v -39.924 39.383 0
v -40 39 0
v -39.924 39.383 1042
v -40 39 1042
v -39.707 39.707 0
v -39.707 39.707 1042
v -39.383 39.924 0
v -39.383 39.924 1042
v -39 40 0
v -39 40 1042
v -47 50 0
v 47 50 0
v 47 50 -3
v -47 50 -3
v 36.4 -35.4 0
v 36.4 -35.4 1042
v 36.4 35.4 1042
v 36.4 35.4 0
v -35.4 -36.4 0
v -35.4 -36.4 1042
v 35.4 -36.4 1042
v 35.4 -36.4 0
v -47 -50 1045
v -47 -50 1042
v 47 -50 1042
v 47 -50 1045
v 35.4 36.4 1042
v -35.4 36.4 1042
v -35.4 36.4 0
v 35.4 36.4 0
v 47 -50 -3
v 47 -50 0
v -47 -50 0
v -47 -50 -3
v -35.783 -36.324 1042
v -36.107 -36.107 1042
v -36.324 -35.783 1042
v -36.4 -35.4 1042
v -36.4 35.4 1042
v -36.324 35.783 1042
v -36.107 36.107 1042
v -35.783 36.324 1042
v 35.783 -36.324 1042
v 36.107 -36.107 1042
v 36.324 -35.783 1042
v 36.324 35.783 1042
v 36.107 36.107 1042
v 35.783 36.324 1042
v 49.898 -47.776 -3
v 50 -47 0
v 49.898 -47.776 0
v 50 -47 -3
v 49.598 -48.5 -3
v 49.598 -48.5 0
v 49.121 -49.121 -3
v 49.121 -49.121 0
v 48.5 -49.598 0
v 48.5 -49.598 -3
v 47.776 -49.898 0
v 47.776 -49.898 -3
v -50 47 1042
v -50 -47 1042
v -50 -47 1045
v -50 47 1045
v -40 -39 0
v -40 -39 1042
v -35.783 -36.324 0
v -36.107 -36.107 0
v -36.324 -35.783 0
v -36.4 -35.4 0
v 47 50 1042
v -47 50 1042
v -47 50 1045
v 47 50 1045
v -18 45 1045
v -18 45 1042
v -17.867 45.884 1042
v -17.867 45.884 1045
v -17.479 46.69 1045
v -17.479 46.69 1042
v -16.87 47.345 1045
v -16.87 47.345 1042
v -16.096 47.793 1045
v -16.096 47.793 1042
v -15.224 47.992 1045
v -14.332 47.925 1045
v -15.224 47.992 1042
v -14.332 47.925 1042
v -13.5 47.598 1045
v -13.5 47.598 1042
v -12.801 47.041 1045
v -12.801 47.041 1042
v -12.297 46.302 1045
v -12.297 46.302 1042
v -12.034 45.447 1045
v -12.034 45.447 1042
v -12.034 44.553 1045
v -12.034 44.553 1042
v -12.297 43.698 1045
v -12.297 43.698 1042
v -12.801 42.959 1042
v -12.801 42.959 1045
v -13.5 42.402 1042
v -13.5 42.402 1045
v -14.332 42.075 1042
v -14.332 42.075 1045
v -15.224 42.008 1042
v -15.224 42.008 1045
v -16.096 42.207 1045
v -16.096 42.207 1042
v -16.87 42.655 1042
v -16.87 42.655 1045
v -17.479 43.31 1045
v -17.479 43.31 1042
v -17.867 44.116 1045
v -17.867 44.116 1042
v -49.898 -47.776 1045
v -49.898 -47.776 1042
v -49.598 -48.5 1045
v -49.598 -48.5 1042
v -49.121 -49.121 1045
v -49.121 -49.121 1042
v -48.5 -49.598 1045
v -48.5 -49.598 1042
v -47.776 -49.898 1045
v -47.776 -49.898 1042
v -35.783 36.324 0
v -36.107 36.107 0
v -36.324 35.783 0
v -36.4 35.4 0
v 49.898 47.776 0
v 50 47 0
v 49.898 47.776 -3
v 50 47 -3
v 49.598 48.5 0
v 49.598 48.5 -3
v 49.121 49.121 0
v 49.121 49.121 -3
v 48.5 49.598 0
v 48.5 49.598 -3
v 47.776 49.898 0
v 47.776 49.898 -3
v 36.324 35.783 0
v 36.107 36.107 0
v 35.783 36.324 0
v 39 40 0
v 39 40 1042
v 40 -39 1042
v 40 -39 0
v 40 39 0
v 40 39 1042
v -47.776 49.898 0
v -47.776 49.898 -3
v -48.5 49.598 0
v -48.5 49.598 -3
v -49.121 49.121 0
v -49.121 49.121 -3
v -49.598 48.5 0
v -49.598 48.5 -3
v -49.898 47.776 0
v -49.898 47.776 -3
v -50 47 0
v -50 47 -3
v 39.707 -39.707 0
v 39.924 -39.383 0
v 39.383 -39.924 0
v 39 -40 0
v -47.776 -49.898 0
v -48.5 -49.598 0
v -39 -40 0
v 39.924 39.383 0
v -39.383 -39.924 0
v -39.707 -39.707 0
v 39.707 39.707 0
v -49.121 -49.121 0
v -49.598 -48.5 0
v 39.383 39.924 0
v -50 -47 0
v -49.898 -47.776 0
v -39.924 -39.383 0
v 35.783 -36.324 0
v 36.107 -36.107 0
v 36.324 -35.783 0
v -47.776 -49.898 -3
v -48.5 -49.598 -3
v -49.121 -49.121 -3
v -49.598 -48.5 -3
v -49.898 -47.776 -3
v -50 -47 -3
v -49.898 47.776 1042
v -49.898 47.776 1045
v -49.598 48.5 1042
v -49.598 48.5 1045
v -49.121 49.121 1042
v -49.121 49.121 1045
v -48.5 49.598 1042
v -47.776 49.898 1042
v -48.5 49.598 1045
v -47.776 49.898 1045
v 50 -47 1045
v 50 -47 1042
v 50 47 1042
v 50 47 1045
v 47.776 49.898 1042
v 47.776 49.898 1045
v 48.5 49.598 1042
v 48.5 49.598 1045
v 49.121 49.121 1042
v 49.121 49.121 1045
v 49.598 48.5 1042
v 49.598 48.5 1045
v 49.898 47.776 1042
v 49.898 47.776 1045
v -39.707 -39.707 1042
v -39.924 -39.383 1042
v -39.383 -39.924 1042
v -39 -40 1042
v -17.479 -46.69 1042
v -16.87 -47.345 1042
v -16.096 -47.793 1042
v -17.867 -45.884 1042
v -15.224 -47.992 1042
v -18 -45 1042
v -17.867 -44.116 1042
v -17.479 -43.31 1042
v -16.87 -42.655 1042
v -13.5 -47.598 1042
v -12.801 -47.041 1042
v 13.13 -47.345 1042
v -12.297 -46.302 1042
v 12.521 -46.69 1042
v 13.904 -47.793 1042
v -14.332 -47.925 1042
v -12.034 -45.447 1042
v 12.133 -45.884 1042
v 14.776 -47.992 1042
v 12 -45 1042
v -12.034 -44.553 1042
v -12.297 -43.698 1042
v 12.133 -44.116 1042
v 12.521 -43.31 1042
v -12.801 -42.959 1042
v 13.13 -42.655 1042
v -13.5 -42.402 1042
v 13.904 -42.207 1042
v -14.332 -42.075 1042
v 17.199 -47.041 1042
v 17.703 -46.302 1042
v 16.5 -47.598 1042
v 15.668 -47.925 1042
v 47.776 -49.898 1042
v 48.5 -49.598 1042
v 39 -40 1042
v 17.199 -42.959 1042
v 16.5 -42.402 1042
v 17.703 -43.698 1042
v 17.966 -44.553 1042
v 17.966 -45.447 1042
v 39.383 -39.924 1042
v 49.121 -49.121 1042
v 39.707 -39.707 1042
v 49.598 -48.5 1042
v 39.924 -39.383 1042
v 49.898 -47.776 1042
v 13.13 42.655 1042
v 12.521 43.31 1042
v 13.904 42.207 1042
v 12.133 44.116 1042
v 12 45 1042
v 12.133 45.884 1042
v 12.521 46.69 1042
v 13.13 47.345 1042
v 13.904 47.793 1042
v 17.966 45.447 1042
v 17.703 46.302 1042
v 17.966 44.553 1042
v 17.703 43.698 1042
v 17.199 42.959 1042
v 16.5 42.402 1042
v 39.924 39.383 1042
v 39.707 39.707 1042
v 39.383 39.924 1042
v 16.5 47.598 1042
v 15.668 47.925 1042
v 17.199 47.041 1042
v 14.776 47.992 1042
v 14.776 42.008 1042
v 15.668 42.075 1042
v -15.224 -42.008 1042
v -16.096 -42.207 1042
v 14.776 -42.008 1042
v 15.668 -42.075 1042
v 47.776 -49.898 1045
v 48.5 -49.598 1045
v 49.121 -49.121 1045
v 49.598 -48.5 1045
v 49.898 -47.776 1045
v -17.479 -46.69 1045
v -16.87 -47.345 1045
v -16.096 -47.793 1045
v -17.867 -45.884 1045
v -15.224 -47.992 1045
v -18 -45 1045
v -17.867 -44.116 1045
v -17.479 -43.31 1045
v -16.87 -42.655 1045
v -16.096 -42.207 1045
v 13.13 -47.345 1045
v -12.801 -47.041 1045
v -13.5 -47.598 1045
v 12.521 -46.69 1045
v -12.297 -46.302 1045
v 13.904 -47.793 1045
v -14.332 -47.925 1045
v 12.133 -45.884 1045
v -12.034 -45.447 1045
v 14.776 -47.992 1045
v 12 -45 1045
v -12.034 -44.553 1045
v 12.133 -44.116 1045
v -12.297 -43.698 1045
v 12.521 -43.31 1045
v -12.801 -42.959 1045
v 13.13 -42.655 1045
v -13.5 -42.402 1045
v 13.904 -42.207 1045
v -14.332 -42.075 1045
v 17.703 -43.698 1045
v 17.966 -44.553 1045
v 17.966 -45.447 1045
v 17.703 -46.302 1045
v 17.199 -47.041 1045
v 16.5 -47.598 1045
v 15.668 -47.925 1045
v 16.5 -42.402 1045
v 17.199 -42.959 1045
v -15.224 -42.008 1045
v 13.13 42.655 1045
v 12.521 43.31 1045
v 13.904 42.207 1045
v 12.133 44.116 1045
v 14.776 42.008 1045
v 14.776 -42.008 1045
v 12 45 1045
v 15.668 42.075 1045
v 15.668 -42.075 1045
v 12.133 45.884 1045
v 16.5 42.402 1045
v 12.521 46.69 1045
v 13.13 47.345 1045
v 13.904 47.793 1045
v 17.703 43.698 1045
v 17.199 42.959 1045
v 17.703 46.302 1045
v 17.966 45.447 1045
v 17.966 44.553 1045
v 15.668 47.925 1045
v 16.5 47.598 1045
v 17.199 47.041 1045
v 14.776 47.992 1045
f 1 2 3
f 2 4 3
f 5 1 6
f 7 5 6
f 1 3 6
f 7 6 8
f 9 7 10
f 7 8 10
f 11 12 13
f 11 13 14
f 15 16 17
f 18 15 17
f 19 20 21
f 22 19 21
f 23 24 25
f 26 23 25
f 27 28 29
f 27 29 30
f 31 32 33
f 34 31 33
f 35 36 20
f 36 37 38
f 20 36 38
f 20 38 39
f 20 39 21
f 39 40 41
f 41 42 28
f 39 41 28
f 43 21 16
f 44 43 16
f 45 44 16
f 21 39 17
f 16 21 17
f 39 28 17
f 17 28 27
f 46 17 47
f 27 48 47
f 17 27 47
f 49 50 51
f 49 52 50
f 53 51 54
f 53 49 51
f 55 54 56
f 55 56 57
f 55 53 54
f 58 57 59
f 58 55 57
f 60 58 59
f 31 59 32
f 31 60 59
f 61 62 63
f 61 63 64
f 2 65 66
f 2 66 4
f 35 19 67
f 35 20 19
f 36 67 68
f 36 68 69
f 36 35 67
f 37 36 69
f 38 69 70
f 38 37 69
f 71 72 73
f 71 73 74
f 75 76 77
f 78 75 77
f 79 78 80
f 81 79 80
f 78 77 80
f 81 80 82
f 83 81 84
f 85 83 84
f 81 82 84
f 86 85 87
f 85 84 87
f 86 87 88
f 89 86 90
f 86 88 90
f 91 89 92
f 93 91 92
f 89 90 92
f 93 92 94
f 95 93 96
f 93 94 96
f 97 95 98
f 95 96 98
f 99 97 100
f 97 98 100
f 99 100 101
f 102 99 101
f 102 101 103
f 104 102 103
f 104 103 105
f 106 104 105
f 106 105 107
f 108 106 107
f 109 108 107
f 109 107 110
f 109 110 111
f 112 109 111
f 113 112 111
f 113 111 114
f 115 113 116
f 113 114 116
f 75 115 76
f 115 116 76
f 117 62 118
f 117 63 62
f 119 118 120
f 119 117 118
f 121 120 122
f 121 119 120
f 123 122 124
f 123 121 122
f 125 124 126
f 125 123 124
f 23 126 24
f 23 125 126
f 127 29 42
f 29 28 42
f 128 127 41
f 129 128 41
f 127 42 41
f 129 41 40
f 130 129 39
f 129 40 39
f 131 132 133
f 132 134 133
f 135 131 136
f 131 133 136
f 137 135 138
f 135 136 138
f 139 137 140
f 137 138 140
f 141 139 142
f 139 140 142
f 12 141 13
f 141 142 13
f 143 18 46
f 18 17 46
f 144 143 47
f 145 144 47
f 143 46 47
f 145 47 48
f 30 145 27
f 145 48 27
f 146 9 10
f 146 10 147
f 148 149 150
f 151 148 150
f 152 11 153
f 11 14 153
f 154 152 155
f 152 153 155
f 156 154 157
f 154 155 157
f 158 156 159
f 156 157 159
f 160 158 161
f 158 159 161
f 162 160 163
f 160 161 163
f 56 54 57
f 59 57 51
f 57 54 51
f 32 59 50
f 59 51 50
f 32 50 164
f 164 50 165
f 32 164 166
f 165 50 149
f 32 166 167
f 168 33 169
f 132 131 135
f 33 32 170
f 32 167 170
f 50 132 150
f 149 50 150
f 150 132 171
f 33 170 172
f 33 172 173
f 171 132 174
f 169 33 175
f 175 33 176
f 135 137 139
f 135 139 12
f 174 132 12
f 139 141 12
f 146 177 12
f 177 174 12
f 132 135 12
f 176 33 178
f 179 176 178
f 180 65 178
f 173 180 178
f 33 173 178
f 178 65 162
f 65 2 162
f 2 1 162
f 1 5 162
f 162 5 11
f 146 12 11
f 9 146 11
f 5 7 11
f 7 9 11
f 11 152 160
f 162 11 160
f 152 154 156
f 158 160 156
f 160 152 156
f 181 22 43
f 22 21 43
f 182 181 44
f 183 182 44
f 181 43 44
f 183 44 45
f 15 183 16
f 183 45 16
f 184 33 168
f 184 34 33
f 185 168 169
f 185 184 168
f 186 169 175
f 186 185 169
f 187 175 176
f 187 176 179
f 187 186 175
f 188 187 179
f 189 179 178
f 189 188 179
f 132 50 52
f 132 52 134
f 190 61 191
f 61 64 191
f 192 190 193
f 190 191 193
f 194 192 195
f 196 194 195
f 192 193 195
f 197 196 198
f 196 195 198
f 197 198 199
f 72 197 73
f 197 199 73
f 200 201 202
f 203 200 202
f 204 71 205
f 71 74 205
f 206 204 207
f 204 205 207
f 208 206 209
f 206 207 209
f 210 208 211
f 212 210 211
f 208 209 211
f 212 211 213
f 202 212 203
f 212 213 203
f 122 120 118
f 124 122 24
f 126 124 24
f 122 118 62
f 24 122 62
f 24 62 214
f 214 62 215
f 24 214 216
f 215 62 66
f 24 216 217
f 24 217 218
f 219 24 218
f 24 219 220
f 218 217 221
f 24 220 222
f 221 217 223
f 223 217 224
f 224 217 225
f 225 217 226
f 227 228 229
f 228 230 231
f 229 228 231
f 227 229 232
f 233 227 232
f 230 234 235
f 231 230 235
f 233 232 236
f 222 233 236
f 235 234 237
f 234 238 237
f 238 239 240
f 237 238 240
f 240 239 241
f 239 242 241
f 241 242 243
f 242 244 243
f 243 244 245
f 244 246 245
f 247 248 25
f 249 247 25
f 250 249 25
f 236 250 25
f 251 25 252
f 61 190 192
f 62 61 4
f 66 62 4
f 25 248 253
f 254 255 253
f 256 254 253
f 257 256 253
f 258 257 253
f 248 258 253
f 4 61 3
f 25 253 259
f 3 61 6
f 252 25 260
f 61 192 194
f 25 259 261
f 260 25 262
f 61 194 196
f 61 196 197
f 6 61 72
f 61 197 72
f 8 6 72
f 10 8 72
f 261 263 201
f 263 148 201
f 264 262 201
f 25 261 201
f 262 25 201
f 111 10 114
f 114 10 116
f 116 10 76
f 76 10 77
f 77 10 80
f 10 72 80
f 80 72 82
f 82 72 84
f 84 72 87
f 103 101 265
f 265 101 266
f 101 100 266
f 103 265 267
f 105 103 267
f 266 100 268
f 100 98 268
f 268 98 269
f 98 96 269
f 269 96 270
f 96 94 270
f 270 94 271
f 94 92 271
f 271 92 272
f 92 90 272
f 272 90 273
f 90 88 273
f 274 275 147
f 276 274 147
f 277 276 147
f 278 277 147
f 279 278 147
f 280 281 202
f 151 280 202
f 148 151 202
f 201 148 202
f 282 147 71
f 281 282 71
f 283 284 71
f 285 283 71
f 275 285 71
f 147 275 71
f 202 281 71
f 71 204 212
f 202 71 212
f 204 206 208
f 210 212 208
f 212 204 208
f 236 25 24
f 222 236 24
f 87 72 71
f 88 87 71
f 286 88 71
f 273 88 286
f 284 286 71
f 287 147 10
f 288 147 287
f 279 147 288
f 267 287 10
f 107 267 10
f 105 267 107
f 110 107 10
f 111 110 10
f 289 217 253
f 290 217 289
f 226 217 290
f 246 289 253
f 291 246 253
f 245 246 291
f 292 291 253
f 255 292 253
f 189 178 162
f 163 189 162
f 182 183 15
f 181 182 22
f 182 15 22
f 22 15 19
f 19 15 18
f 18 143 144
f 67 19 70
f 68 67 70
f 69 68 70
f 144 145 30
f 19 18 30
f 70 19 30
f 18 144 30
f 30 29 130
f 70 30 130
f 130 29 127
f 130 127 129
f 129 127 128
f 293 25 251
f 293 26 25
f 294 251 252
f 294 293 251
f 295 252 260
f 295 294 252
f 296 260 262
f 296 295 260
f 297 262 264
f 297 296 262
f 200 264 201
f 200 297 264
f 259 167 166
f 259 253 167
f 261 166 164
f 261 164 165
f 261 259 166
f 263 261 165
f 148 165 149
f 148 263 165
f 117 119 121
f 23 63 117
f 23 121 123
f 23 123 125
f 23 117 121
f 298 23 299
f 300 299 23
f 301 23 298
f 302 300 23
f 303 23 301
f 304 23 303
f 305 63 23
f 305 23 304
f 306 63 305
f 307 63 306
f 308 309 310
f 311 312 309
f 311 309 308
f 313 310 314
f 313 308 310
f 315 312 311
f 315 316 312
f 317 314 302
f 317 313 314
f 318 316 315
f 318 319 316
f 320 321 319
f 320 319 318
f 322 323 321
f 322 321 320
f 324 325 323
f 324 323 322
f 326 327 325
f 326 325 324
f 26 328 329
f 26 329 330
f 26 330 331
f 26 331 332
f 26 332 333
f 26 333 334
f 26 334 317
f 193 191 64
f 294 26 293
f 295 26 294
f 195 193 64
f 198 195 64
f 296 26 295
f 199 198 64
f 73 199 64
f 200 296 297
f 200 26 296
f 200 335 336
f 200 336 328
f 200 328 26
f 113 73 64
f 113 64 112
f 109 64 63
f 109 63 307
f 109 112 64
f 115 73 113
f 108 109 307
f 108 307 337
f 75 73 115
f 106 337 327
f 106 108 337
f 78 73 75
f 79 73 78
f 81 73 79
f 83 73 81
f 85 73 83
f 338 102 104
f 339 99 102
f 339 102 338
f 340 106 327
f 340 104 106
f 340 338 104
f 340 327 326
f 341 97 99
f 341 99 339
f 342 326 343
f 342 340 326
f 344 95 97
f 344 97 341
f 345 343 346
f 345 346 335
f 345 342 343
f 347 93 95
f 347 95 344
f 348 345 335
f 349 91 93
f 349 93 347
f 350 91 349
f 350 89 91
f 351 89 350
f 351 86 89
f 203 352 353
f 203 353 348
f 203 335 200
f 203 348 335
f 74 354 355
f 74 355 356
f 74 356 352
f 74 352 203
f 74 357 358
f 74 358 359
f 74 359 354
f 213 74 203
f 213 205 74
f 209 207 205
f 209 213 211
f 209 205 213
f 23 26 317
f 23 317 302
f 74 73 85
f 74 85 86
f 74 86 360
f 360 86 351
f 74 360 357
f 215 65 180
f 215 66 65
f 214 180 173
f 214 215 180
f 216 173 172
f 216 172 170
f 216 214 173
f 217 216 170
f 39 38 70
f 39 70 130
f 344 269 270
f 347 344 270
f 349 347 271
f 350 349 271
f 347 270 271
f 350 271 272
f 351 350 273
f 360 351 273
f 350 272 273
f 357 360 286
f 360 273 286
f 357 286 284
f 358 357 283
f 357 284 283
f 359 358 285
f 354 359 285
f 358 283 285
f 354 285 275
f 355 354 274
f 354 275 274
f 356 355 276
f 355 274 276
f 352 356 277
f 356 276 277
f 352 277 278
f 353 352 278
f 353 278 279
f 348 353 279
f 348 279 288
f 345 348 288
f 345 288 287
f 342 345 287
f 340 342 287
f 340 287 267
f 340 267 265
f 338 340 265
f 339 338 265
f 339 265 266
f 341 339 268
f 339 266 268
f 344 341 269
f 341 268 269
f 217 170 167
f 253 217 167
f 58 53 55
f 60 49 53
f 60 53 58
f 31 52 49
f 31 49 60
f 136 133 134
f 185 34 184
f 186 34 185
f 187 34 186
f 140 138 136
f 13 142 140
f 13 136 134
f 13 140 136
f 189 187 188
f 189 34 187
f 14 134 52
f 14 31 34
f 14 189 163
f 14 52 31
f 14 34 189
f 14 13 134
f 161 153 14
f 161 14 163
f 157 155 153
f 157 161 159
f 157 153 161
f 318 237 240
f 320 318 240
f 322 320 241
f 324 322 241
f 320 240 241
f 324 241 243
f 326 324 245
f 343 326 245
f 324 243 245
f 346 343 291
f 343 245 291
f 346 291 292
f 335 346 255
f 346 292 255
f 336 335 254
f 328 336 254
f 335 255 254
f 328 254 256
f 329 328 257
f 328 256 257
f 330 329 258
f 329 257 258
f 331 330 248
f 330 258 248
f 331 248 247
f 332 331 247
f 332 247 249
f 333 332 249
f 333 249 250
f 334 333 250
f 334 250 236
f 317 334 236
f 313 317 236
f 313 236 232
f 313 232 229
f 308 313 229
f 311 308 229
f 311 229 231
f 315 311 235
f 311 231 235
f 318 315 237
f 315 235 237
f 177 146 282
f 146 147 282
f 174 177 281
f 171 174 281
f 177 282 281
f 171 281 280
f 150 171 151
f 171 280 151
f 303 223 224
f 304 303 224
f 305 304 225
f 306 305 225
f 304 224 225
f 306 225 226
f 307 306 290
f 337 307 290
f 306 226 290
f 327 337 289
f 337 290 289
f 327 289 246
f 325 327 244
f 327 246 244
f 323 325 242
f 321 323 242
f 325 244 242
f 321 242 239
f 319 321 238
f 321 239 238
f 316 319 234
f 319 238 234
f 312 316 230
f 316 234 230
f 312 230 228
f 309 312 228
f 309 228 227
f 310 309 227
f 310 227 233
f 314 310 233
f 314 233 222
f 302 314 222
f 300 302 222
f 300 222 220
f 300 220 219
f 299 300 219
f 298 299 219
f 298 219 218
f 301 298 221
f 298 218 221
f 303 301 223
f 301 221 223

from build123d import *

# Parameters (mm, degrees)
SKETCH2_W           = 80
SKETCH2_H           = 80
SKETCH2_W_2         = 72.8
SKETCH2_H_2         = 72.8
BOSS_EXTRUDE1_DEPTH = 1042
FILLET1_R           = 1
FILLET2_R           = 1
SKETCH3_W           = 100
SKETCH3_H           = 100
BOSS_EXTRUDE2_DEPTH = 3
FILLET3_R           = 3
SKETCH5_R           = 3
CUT_EXTRUDE1_DEPTH  = 3
SKETCH6_W           = 100
SKETCH6_H           = 100
BOSS_EXTRUDE3_DEPTH = 3
FILLET4_R           = 3


with BuildPart() as part:
    # Sketch2 → Boss-Extrude1 (new body)
    with BuildSketch(Plane.XY):
        Rectangle(SKETCH2_W, SKETCH2_H)
        Rectangle(SKETCH2_W_2, SKETCH2_H_2, mode=Mode.SUBTRACT)
    extrude(amount=BOSS_EXTRUDE1_DEPTH)

    # Fillet1
    fillet1_edges = [part.edges().sort_by_distance(p)[0] for p in [
        (40, -40, 521),
        (-40, -40, 521),
        (-40, 40, 521),
        (40, 40, 521),
    ]]
    fillet(fillet1_edges, radius=FILLET1_R)

    # Fillet2
    fillet2_edges = [part.edges().sort_by_distance(p)[0] for p in [
        (-36.4, 36.4, 521),
        (-36.4, -36.4, 521),
        (36.4, -36.4, 521),
        (36.4, 36.4, 521),
    ]]
    fillet(fillet2_edges, radius=FILLET2_R)

    # Sketch3 → Boss-Extrude2 (add)
    with BuildSketch(Plane.XY.offset(1042)):
        Rectangle(SKETCH3_W, SKETCH3_H)
    extrude(amount=BOSS_EXTRUDE2_DEPTH)

    # Fillet3
    fillet3_edges = [part.edges().sort_by_distance(p)[0] for p in [
        (50, -50, 1043.5),
        (50, 50, 1043.5),
        (-50, 50, 1043.5),
        (-50, -50, 1043.5),
    ]]
    fillet(fillet3_edges, radius=FILLET3_R)

    # Sketch5 → Cut-Extrude1 (cut)
    with BuildSketch(Plane(origin=(0, 0, 1042), x_dir=(-1, 0, 0), z_dir=(0, 0, -1))):
        with Locations((15, -45)):
            Circle(SKETCH5_R)
        with Locations((-15, -45)):
            Circle(SKETCH5_R)
        with Locations((15, 45)):
            Circle(SKETCH5_R)
        with Locations((-15, 45)):
            Circle(SKETCH5_R)
    extrude(amount=-CUT_EXTRUDE1_DEPTH, mode=Mode.SUBTRACT)

    # Sketch6 → Boss-Extrude3 (add)
    with BuildSketch(Plane(origin=(0, 0, 0), x_dir=(-1, 0, 0), z_dir=(0, 0, -1))):
        Rectangle(SKETCH6_W, SKETCH6_H)
    extrude(amount=BOSS_EXTRUDE3_DEPTH)

    # Fillet4
    fillet4_edges = [part.edges().sort_by_distance(p)[0] for p in [
        (-50, -50, -1.5),
        (-50, 50, -1.5),
        (50, 50, -1.5),
        (50, -50, -1.5),
    ]]
    fillet(fillet4_edges, radius=FILLET4_R)


solid = part.part
